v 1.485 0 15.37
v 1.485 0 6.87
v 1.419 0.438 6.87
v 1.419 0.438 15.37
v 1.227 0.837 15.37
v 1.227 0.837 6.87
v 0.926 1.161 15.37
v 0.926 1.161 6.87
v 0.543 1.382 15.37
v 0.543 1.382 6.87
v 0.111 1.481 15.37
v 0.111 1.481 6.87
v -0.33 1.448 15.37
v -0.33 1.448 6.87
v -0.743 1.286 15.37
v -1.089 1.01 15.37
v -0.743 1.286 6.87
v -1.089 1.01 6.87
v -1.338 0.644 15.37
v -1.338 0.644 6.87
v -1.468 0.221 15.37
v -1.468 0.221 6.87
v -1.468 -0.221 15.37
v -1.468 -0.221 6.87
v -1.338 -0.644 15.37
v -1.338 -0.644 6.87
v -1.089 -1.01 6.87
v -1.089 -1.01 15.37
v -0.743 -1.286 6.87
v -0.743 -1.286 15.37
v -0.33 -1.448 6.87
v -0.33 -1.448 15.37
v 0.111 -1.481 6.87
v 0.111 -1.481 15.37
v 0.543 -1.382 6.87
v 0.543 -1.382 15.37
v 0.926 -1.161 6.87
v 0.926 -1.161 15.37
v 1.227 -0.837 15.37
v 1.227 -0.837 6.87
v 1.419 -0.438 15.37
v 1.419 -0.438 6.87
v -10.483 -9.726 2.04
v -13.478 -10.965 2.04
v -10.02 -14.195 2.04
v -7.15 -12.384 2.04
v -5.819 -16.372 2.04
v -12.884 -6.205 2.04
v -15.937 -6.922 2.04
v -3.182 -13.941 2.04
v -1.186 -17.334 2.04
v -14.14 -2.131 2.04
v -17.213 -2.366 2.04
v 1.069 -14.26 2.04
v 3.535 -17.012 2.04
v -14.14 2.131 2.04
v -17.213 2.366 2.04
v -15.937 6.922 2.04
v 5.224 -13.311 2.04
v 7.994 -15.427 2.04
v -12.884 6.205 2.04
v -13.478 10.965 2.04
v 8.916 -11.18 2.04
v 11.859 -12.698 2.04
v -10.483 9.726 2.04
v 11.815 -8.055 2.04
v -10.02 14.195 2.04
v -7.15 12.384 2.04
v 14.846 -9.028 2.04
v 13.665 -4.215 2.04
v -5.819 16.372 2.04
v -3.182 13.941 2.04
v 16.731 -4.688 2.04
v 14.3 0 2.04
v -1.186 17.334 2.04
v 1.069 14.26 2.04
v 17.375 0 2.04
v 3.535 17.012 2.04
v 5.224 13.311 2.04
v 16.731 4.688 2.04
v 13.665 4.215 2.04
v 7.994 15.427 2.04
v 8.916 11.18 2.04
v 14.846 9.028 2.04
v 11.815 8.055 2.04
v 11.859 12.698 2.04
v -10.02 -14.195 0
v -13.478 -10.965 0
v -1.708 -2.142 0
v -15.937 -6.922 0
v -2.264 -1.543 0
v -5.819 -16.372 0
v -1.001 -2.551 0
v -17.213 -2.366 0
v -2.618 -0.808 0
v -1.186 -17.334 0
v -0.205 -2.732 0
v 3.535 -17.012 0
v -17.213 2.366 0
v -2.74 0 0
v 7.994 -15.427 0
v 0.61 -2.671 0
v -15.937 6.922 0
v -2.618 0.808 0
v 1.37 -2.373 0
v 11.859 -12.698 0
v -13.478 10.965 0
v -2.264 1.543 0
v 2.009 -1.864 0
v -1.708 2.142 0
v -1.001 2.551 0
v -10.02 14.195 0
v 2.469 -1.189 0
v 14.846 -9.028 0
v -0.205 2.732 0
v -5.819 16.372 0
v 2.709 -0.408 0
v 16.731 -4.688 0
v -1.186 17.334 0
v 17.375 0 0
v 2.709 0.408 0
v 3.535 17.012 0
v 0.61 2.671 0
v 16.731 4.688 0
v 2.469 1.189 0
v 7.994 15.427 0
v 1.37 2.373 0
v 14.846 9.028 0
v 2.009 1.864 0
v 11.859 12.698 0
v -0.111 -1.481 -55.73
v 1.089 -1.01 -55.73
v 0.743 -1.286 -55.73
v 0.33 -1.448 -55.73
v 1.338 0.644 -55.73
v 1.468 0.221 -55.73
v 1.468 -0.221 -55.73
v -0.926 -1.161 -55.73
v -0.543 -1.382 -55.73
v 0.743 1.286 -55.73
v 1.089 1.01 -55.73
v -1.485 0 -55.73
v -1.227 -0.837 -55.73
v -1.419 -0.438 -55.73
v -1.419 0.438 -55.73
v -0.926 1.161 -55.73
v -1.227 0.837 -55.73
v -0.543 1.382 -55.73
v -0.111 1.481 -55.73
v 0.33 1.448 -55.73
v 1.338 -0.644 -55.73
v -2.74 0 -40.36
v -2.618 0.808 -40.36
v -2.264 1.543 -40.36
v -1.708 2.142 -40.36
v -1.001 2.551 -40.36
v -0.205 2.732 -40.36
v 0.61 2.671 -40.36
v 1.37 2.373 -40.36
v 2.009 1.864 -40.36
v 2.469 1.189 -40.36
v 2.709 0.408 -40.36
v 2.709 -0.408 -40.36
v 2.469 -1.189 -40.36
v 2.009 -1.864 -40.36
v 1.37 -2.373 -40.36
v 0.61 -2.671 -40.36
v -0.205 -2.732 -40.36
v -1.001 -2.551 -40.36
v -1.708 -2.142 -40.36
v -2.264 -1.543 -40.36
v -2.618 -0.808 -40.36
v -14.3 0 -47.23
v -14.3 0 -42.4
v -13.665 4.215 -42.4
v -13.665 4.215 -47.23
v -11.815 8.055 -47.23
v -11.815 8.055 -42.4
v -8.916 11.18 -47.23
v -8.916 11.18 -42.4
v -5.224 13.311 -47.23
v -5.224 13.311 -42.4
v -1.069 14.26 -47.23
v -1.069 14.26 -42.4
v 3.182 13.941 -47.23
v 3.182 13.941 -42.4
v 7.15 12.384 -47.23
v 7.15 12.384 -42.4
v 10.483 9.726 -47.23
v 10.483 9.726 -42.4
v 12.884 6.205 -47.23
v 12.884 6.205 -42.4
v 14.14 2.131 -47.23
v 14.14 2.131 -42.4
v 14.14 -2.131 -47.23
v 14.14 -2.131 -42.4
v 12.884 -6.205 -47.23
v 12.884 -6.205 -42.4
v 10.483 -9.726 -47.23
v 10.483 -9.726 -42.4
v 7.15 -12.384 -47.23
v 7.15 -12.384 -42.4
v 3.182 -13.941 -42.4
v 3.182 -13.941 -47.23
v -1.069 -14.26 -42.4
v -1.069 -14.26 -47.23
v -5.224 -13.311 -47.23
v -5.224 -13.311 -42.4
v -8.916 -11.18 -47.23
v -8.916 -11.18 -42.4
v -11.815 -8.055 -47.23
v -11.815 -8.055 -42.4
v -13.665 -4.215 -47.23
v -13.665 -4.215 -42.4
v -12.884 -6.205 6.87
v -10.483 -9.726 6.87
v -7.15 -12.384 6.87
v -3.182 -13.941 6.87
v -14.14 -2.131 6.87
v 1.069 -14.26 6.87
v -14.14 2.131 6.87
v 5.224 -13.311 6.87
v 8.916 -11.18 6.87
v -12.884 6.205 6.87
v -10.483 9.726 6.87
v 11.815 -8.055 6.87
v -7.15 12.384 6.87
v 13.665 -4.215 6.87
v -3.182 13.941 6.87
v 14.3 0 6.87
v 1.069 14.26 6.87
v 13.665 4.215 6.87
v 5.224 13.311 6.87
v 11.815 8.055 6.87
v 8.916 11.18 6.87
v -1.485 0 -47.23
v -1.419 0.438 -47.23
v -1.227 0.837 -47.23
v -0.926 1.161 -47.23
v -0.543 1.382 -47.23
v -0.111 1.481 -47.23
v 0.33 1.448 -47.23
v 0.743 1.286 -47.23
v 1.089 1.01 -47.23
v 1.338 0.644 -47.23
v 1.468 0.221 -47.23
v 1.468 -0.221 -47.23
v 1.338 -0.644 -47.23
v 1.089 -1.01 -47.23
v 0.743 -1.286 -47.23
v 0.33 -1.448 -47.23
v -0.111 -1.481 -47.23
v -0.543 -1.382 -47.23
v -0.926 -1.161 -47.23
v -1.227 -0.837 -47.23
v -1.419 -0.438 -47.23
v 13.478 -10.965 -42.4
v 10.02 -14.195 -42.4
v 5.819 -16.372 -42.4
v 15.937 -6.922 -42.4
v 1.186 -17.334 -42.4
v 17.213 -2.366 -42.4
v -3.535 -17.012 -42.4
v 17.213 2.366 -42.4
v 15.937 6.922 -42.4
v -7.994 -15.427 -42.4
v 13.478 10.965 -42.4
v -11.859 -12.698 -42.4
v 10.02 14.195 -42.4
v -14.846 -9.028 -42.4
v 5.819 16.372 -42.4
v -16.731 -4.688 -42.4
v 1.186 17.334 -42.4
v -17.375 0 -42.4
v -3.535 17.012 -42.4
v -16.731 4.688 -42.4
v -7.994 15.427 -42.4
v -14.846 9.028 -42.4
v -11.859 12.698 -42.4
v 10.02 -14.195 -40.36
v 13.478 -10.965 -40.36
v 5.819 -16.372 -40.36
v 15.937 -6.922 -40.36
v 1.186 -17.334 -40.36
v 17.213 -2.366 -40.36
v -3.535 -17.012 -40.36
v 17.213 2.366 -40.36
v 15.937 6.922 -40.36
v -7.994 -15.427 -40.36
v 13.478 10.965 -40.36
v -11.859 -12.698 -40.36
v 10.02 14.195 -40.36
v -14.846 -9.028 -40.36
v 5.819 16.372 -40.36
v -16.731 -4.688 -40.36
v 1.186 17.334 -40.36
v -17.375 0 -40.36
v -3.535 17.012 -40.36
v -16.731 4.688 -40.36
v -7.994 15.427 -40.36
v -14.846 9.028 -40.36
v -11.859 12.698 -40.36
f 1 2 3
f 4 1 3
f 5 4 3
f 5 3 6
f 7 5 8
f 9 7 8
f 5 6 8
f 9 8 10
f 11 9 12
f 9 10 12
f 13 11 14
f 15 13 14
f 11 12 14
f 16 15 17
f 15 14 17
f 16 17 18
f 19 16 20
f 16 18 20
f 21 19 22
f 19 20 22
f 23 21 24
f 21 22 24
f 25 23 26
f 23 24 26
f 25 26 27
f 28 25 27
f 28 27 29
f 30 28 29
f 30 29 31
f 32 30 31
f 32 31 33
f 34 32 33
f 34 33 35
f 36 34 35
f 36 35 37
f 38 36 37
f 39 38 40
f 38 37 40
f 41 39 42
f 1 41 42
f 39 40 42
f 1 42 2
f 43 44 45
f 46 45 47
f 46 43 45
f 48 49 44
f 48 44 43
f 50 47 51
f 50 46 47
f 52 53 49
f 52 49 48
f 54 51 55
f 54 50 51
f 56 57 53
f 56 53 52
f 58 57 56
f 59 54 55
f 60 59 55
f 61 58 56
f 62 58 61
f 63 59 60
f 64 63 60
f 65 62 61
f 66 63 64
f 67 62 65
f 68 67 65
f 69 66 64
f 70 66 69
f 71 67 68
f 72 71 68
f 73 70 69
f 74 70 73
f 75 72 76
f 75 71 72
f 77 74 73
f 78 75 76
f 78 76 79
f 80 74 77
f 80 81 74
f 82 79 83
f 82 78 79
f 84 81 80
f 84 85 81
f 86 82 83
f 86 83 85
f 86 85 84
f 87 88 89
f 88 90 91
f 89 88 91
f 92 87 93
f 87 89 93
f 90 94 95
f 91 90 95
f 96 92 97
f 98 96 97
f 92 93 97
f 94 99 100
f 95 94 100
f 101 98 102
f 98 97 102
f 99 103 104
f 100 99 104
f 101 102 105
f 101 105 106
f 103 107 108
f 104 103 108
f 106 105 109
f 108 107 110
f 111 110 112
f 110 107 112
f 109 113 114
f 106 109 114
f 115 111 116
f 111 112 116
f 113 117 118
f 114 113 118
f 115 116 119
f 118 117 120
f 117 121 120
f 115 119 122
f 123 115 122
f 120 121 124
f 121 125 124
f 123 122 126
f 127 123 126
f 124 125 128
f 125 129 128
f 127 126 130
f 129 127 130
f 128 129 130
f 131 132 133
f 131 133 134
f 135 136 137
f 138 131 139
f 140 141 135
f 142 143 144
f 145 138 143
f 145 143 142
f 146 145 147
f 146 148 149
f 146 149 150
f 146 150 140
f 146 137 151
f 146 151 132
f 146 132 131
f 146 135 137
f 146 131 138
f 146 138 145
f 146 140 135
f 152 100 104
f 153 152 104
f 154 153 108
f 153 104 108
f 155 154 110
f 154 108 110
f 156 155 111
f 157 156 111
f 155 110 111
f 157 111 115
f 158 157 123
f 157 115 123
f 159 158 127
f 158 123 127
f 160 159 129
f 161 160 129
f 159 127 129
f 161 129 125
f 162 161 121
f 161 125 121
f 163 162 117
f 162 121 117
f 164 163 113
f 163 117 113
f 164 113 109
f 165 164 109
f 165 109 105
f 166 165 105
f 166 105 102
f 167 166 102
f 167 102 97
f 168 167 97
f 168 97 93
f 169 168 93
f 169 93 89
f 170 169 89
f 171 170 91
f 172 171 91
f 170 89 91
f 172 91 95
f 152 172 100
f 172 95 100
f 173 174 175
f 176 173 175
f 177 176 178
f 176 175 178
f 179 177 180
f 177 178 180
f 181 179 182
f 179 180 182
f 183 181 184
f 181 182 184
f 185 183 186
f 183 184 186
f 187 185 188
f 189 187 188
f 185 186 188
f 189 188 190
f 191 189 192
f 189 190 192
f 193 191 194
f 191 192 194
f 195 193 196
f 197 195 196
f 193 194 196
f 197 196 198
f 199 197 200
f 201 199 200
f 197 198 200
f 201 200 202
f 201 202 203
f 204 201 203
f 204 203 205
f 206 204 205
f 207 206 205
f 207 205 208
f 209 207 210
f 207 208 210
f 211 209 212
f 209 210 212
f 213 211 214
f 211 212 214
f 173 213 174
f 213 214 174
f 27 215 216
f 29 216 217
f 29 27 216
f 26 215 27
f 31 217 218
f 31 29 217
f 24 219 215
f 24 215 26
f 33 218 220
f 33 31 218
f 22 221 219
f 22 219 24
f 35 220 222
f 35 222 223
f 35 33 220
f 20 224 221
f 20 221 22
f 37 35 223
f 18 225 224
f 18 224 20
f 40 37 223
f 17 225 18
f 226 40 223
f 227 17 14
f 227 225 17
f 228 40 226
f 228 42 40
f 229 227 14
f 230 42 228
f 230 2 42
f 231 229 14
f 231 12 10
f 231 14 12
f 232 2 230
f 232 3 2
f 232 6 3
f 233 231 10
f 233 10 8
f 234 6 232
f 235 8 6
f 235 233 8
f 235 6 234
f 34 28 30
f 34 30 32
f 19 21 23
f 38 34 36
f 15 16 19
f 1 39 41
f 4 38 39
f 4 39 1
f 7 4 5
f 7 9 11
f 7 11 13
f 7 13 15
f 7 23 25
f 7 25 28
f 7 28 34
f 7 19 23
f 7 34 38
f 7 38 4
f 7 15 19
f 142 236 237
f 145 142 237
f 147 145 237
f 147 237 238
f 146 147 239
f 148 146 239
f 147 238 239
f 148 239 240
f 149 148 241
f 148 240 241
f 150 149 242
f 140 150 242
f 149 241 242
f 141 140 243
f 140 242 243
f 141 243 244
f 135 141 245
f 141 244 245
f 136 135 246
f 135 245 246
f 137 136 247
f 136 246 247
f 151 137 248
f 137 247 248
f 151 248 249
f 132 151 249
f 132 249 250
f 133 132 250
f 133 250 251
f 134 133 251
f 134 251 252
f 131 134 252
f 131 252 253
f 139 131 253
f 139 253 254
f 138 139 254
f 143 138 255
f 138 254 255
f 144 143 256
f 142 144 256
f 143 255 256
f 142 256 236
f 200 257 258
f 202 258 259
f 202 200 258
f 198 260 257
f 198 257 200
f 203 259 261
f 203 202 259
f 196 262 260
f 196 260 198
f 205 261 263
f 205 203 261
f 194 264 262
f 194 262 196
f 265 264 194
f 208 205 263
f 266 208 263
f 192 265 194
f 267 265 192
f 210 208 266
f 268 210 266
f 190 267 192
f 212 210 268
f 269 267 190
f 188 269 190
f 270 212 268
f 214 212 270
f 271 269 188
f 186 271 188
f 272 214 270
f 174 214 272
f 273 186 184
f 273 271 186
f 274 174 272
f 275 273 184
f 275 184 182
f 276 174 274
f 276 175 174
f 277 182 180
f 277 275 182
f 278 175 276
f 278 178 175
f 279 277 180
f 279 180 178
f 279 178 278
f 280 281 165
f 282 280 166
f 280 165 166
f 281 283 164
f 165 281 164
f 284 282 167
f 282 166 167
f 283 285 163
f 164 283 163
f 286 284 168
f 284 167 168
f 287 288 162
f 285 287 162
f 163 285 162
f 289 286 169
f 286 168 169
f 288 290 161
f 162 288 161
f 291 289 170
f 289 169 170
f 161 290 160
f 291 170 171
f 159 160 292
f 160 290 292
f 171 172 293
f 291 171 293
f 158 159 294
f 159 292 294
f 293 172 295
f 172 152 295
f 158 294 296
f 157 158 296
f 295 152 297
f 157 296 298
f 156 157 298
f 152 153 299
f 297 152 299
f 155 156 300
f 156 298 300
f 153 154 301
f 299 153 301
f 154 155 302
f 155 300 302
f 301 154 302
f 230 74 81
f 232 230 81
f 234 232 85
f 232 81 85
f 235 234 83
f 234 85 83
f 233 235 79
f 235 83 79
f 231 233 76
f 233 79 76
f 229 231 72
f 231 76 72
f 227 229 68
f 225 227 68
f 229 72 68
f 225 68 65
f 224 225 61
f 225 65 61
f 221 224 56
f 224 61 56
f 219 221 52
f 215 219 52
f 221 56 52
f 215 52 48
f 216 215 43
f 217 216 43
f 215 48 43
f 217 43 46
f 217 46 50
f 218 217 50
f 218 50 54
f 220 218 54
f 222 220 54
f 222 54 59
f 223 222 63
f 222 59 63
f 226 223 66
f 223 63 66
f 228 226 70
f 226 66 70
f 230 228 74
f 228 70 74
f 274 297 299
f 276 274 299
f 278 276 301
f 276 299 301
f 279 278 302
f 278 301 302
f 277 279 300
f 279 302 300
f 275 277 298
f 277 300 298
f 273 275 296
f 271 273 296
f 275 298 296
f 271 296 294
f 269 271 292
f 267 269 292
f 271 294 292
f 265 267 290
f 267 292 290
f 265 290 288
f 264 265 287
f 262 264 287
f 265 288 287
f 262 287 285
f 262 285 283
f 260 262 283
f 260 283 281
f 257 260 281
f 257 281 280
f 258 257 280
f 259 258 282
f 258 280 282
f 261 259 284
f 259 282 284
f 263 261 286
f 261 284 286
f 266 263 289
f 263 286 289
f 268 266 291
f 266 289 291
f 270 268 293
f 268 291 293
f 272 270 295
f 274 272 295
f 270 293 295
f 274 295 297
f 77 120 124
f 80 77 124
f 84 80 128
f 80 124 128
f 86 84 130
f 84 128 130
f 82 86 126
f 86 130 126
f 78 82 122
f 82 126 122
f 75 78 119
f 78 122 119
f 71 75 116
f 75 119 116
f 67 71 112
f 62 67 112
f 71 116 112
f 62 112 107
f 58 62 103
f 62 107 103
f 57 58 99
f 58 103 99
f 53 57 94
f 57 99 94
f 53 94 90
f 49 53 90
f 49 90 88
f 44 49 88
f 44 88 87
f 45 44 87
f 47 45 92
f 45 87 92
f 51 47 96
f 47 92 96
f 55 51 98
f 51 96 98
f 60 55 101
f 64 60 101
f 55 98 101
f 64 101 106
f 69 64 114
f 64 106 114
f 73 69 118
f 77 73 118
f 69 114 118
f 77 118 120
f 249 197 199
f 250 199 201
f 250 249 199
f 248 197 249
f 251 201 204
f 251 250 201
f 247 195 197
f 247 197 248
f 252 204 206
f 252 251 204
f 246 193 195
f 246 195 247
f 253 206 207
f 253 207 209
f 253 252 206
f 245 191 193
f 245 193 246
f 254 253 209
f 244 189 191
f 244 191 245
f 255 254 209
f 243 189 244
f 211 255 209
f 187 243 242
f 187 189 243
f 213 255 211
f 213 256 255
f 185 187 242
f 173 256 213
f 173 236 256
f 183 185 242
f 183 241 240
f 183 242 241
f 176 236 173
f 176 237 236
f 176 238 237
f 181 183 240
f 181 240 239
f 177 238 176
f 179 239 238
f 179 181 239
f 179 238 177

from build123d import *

# Parameters (mm, degrees)
SKETCH1_R           = 17.375
BOSS_EXTRUDE1_DEPTH = 2.04
SKETCH2_R           = 14.3
BOSS_EXTRUDE2_DEPTH = 4.83
SKETCH3_R           = 2.74
BOSS_EXTRUDE3_DEPTH = 40.36
SKETCH4_R           = 17.375
BOSS_EXTRUDE4_DEPTH = 2.04
SKETCH5_R           = 14.3
BOSS_EXTRUDE5_DEPTH = 4.83
SKETCH6_R           = 1.485
BOSS_EXTRUDE6_DEPTH = 8.5
SKETCH7_R           = 1.485
BOSS_EXTRUDE7_DEPTH = 8.5


with BuildPart() as part:
    # Sketch1 → Boss-Extrude1 (new body)
    with BuildSketch(Plane.XY):
        Circle(SKETCH1_R)
    extrude(amount=BOSS_EXTRUDE1_DEPTH)

    # Sketch2 → Boss-Extrude2 (add)
    with BuildSketch(Plane.XY.offset(2.04)):
        Circle(SKETCH2_R)
    extrude(amount=BOSS_EXTRUDE2_DEPTH)

    # Sketch3 → Boss-Extrude3 (add)
    with BuildSketch(Plane(origin=(0, 0, 0), x_dir=(-1, 0, 0), z_dir=(0, 0, -1))):
        Circle(SKETCH3_R)
    extrude(amount=BOSS_EXTRUDE3_DEPTH)

    # Sketch4 → Boss-Extrude4 (add)
    with BuildSketch(Plane(origin=(0, 0, -40.36), x_dir=(-1, 0, 0), z_dir=(0, 0, -1))):
        Circle(SKETCH4_R)
    extrude(amount=BOSS_EXTRUDE4_DEPTH)

    # Sketch5 → Boss-Extrude5 (add)
    with BuildSketch(Plane(origin=(0, 0, -42.4), x_dir=(-1, 0, 0), z_dir=(0, 0, -1))):
        Circle(SKETCH5_R)
    extrude(amount=BOSS_EXTRUDE5_DEPTH)

    # Sketch6 → Boss-Extrude6 (add)
    with BuildSketch(Plane(origin=(0, 0, -47.23), x_dir=(-1, 0, 0), z_dir=(0, 0, -1))):
        Circle(SKETCH6_R)
    extrude(amount=BOSS_EXTRUDE6_DEPTH)

    # Sketch7 → Boss-Extrude7 (add)
    with BuildSketch(Plane.XY.offset(6.87)):
        Circle(SKETCH7_R)
    extrude(amount=BOSS_EXTRUDE7_DEPTH)


solid = part.part
